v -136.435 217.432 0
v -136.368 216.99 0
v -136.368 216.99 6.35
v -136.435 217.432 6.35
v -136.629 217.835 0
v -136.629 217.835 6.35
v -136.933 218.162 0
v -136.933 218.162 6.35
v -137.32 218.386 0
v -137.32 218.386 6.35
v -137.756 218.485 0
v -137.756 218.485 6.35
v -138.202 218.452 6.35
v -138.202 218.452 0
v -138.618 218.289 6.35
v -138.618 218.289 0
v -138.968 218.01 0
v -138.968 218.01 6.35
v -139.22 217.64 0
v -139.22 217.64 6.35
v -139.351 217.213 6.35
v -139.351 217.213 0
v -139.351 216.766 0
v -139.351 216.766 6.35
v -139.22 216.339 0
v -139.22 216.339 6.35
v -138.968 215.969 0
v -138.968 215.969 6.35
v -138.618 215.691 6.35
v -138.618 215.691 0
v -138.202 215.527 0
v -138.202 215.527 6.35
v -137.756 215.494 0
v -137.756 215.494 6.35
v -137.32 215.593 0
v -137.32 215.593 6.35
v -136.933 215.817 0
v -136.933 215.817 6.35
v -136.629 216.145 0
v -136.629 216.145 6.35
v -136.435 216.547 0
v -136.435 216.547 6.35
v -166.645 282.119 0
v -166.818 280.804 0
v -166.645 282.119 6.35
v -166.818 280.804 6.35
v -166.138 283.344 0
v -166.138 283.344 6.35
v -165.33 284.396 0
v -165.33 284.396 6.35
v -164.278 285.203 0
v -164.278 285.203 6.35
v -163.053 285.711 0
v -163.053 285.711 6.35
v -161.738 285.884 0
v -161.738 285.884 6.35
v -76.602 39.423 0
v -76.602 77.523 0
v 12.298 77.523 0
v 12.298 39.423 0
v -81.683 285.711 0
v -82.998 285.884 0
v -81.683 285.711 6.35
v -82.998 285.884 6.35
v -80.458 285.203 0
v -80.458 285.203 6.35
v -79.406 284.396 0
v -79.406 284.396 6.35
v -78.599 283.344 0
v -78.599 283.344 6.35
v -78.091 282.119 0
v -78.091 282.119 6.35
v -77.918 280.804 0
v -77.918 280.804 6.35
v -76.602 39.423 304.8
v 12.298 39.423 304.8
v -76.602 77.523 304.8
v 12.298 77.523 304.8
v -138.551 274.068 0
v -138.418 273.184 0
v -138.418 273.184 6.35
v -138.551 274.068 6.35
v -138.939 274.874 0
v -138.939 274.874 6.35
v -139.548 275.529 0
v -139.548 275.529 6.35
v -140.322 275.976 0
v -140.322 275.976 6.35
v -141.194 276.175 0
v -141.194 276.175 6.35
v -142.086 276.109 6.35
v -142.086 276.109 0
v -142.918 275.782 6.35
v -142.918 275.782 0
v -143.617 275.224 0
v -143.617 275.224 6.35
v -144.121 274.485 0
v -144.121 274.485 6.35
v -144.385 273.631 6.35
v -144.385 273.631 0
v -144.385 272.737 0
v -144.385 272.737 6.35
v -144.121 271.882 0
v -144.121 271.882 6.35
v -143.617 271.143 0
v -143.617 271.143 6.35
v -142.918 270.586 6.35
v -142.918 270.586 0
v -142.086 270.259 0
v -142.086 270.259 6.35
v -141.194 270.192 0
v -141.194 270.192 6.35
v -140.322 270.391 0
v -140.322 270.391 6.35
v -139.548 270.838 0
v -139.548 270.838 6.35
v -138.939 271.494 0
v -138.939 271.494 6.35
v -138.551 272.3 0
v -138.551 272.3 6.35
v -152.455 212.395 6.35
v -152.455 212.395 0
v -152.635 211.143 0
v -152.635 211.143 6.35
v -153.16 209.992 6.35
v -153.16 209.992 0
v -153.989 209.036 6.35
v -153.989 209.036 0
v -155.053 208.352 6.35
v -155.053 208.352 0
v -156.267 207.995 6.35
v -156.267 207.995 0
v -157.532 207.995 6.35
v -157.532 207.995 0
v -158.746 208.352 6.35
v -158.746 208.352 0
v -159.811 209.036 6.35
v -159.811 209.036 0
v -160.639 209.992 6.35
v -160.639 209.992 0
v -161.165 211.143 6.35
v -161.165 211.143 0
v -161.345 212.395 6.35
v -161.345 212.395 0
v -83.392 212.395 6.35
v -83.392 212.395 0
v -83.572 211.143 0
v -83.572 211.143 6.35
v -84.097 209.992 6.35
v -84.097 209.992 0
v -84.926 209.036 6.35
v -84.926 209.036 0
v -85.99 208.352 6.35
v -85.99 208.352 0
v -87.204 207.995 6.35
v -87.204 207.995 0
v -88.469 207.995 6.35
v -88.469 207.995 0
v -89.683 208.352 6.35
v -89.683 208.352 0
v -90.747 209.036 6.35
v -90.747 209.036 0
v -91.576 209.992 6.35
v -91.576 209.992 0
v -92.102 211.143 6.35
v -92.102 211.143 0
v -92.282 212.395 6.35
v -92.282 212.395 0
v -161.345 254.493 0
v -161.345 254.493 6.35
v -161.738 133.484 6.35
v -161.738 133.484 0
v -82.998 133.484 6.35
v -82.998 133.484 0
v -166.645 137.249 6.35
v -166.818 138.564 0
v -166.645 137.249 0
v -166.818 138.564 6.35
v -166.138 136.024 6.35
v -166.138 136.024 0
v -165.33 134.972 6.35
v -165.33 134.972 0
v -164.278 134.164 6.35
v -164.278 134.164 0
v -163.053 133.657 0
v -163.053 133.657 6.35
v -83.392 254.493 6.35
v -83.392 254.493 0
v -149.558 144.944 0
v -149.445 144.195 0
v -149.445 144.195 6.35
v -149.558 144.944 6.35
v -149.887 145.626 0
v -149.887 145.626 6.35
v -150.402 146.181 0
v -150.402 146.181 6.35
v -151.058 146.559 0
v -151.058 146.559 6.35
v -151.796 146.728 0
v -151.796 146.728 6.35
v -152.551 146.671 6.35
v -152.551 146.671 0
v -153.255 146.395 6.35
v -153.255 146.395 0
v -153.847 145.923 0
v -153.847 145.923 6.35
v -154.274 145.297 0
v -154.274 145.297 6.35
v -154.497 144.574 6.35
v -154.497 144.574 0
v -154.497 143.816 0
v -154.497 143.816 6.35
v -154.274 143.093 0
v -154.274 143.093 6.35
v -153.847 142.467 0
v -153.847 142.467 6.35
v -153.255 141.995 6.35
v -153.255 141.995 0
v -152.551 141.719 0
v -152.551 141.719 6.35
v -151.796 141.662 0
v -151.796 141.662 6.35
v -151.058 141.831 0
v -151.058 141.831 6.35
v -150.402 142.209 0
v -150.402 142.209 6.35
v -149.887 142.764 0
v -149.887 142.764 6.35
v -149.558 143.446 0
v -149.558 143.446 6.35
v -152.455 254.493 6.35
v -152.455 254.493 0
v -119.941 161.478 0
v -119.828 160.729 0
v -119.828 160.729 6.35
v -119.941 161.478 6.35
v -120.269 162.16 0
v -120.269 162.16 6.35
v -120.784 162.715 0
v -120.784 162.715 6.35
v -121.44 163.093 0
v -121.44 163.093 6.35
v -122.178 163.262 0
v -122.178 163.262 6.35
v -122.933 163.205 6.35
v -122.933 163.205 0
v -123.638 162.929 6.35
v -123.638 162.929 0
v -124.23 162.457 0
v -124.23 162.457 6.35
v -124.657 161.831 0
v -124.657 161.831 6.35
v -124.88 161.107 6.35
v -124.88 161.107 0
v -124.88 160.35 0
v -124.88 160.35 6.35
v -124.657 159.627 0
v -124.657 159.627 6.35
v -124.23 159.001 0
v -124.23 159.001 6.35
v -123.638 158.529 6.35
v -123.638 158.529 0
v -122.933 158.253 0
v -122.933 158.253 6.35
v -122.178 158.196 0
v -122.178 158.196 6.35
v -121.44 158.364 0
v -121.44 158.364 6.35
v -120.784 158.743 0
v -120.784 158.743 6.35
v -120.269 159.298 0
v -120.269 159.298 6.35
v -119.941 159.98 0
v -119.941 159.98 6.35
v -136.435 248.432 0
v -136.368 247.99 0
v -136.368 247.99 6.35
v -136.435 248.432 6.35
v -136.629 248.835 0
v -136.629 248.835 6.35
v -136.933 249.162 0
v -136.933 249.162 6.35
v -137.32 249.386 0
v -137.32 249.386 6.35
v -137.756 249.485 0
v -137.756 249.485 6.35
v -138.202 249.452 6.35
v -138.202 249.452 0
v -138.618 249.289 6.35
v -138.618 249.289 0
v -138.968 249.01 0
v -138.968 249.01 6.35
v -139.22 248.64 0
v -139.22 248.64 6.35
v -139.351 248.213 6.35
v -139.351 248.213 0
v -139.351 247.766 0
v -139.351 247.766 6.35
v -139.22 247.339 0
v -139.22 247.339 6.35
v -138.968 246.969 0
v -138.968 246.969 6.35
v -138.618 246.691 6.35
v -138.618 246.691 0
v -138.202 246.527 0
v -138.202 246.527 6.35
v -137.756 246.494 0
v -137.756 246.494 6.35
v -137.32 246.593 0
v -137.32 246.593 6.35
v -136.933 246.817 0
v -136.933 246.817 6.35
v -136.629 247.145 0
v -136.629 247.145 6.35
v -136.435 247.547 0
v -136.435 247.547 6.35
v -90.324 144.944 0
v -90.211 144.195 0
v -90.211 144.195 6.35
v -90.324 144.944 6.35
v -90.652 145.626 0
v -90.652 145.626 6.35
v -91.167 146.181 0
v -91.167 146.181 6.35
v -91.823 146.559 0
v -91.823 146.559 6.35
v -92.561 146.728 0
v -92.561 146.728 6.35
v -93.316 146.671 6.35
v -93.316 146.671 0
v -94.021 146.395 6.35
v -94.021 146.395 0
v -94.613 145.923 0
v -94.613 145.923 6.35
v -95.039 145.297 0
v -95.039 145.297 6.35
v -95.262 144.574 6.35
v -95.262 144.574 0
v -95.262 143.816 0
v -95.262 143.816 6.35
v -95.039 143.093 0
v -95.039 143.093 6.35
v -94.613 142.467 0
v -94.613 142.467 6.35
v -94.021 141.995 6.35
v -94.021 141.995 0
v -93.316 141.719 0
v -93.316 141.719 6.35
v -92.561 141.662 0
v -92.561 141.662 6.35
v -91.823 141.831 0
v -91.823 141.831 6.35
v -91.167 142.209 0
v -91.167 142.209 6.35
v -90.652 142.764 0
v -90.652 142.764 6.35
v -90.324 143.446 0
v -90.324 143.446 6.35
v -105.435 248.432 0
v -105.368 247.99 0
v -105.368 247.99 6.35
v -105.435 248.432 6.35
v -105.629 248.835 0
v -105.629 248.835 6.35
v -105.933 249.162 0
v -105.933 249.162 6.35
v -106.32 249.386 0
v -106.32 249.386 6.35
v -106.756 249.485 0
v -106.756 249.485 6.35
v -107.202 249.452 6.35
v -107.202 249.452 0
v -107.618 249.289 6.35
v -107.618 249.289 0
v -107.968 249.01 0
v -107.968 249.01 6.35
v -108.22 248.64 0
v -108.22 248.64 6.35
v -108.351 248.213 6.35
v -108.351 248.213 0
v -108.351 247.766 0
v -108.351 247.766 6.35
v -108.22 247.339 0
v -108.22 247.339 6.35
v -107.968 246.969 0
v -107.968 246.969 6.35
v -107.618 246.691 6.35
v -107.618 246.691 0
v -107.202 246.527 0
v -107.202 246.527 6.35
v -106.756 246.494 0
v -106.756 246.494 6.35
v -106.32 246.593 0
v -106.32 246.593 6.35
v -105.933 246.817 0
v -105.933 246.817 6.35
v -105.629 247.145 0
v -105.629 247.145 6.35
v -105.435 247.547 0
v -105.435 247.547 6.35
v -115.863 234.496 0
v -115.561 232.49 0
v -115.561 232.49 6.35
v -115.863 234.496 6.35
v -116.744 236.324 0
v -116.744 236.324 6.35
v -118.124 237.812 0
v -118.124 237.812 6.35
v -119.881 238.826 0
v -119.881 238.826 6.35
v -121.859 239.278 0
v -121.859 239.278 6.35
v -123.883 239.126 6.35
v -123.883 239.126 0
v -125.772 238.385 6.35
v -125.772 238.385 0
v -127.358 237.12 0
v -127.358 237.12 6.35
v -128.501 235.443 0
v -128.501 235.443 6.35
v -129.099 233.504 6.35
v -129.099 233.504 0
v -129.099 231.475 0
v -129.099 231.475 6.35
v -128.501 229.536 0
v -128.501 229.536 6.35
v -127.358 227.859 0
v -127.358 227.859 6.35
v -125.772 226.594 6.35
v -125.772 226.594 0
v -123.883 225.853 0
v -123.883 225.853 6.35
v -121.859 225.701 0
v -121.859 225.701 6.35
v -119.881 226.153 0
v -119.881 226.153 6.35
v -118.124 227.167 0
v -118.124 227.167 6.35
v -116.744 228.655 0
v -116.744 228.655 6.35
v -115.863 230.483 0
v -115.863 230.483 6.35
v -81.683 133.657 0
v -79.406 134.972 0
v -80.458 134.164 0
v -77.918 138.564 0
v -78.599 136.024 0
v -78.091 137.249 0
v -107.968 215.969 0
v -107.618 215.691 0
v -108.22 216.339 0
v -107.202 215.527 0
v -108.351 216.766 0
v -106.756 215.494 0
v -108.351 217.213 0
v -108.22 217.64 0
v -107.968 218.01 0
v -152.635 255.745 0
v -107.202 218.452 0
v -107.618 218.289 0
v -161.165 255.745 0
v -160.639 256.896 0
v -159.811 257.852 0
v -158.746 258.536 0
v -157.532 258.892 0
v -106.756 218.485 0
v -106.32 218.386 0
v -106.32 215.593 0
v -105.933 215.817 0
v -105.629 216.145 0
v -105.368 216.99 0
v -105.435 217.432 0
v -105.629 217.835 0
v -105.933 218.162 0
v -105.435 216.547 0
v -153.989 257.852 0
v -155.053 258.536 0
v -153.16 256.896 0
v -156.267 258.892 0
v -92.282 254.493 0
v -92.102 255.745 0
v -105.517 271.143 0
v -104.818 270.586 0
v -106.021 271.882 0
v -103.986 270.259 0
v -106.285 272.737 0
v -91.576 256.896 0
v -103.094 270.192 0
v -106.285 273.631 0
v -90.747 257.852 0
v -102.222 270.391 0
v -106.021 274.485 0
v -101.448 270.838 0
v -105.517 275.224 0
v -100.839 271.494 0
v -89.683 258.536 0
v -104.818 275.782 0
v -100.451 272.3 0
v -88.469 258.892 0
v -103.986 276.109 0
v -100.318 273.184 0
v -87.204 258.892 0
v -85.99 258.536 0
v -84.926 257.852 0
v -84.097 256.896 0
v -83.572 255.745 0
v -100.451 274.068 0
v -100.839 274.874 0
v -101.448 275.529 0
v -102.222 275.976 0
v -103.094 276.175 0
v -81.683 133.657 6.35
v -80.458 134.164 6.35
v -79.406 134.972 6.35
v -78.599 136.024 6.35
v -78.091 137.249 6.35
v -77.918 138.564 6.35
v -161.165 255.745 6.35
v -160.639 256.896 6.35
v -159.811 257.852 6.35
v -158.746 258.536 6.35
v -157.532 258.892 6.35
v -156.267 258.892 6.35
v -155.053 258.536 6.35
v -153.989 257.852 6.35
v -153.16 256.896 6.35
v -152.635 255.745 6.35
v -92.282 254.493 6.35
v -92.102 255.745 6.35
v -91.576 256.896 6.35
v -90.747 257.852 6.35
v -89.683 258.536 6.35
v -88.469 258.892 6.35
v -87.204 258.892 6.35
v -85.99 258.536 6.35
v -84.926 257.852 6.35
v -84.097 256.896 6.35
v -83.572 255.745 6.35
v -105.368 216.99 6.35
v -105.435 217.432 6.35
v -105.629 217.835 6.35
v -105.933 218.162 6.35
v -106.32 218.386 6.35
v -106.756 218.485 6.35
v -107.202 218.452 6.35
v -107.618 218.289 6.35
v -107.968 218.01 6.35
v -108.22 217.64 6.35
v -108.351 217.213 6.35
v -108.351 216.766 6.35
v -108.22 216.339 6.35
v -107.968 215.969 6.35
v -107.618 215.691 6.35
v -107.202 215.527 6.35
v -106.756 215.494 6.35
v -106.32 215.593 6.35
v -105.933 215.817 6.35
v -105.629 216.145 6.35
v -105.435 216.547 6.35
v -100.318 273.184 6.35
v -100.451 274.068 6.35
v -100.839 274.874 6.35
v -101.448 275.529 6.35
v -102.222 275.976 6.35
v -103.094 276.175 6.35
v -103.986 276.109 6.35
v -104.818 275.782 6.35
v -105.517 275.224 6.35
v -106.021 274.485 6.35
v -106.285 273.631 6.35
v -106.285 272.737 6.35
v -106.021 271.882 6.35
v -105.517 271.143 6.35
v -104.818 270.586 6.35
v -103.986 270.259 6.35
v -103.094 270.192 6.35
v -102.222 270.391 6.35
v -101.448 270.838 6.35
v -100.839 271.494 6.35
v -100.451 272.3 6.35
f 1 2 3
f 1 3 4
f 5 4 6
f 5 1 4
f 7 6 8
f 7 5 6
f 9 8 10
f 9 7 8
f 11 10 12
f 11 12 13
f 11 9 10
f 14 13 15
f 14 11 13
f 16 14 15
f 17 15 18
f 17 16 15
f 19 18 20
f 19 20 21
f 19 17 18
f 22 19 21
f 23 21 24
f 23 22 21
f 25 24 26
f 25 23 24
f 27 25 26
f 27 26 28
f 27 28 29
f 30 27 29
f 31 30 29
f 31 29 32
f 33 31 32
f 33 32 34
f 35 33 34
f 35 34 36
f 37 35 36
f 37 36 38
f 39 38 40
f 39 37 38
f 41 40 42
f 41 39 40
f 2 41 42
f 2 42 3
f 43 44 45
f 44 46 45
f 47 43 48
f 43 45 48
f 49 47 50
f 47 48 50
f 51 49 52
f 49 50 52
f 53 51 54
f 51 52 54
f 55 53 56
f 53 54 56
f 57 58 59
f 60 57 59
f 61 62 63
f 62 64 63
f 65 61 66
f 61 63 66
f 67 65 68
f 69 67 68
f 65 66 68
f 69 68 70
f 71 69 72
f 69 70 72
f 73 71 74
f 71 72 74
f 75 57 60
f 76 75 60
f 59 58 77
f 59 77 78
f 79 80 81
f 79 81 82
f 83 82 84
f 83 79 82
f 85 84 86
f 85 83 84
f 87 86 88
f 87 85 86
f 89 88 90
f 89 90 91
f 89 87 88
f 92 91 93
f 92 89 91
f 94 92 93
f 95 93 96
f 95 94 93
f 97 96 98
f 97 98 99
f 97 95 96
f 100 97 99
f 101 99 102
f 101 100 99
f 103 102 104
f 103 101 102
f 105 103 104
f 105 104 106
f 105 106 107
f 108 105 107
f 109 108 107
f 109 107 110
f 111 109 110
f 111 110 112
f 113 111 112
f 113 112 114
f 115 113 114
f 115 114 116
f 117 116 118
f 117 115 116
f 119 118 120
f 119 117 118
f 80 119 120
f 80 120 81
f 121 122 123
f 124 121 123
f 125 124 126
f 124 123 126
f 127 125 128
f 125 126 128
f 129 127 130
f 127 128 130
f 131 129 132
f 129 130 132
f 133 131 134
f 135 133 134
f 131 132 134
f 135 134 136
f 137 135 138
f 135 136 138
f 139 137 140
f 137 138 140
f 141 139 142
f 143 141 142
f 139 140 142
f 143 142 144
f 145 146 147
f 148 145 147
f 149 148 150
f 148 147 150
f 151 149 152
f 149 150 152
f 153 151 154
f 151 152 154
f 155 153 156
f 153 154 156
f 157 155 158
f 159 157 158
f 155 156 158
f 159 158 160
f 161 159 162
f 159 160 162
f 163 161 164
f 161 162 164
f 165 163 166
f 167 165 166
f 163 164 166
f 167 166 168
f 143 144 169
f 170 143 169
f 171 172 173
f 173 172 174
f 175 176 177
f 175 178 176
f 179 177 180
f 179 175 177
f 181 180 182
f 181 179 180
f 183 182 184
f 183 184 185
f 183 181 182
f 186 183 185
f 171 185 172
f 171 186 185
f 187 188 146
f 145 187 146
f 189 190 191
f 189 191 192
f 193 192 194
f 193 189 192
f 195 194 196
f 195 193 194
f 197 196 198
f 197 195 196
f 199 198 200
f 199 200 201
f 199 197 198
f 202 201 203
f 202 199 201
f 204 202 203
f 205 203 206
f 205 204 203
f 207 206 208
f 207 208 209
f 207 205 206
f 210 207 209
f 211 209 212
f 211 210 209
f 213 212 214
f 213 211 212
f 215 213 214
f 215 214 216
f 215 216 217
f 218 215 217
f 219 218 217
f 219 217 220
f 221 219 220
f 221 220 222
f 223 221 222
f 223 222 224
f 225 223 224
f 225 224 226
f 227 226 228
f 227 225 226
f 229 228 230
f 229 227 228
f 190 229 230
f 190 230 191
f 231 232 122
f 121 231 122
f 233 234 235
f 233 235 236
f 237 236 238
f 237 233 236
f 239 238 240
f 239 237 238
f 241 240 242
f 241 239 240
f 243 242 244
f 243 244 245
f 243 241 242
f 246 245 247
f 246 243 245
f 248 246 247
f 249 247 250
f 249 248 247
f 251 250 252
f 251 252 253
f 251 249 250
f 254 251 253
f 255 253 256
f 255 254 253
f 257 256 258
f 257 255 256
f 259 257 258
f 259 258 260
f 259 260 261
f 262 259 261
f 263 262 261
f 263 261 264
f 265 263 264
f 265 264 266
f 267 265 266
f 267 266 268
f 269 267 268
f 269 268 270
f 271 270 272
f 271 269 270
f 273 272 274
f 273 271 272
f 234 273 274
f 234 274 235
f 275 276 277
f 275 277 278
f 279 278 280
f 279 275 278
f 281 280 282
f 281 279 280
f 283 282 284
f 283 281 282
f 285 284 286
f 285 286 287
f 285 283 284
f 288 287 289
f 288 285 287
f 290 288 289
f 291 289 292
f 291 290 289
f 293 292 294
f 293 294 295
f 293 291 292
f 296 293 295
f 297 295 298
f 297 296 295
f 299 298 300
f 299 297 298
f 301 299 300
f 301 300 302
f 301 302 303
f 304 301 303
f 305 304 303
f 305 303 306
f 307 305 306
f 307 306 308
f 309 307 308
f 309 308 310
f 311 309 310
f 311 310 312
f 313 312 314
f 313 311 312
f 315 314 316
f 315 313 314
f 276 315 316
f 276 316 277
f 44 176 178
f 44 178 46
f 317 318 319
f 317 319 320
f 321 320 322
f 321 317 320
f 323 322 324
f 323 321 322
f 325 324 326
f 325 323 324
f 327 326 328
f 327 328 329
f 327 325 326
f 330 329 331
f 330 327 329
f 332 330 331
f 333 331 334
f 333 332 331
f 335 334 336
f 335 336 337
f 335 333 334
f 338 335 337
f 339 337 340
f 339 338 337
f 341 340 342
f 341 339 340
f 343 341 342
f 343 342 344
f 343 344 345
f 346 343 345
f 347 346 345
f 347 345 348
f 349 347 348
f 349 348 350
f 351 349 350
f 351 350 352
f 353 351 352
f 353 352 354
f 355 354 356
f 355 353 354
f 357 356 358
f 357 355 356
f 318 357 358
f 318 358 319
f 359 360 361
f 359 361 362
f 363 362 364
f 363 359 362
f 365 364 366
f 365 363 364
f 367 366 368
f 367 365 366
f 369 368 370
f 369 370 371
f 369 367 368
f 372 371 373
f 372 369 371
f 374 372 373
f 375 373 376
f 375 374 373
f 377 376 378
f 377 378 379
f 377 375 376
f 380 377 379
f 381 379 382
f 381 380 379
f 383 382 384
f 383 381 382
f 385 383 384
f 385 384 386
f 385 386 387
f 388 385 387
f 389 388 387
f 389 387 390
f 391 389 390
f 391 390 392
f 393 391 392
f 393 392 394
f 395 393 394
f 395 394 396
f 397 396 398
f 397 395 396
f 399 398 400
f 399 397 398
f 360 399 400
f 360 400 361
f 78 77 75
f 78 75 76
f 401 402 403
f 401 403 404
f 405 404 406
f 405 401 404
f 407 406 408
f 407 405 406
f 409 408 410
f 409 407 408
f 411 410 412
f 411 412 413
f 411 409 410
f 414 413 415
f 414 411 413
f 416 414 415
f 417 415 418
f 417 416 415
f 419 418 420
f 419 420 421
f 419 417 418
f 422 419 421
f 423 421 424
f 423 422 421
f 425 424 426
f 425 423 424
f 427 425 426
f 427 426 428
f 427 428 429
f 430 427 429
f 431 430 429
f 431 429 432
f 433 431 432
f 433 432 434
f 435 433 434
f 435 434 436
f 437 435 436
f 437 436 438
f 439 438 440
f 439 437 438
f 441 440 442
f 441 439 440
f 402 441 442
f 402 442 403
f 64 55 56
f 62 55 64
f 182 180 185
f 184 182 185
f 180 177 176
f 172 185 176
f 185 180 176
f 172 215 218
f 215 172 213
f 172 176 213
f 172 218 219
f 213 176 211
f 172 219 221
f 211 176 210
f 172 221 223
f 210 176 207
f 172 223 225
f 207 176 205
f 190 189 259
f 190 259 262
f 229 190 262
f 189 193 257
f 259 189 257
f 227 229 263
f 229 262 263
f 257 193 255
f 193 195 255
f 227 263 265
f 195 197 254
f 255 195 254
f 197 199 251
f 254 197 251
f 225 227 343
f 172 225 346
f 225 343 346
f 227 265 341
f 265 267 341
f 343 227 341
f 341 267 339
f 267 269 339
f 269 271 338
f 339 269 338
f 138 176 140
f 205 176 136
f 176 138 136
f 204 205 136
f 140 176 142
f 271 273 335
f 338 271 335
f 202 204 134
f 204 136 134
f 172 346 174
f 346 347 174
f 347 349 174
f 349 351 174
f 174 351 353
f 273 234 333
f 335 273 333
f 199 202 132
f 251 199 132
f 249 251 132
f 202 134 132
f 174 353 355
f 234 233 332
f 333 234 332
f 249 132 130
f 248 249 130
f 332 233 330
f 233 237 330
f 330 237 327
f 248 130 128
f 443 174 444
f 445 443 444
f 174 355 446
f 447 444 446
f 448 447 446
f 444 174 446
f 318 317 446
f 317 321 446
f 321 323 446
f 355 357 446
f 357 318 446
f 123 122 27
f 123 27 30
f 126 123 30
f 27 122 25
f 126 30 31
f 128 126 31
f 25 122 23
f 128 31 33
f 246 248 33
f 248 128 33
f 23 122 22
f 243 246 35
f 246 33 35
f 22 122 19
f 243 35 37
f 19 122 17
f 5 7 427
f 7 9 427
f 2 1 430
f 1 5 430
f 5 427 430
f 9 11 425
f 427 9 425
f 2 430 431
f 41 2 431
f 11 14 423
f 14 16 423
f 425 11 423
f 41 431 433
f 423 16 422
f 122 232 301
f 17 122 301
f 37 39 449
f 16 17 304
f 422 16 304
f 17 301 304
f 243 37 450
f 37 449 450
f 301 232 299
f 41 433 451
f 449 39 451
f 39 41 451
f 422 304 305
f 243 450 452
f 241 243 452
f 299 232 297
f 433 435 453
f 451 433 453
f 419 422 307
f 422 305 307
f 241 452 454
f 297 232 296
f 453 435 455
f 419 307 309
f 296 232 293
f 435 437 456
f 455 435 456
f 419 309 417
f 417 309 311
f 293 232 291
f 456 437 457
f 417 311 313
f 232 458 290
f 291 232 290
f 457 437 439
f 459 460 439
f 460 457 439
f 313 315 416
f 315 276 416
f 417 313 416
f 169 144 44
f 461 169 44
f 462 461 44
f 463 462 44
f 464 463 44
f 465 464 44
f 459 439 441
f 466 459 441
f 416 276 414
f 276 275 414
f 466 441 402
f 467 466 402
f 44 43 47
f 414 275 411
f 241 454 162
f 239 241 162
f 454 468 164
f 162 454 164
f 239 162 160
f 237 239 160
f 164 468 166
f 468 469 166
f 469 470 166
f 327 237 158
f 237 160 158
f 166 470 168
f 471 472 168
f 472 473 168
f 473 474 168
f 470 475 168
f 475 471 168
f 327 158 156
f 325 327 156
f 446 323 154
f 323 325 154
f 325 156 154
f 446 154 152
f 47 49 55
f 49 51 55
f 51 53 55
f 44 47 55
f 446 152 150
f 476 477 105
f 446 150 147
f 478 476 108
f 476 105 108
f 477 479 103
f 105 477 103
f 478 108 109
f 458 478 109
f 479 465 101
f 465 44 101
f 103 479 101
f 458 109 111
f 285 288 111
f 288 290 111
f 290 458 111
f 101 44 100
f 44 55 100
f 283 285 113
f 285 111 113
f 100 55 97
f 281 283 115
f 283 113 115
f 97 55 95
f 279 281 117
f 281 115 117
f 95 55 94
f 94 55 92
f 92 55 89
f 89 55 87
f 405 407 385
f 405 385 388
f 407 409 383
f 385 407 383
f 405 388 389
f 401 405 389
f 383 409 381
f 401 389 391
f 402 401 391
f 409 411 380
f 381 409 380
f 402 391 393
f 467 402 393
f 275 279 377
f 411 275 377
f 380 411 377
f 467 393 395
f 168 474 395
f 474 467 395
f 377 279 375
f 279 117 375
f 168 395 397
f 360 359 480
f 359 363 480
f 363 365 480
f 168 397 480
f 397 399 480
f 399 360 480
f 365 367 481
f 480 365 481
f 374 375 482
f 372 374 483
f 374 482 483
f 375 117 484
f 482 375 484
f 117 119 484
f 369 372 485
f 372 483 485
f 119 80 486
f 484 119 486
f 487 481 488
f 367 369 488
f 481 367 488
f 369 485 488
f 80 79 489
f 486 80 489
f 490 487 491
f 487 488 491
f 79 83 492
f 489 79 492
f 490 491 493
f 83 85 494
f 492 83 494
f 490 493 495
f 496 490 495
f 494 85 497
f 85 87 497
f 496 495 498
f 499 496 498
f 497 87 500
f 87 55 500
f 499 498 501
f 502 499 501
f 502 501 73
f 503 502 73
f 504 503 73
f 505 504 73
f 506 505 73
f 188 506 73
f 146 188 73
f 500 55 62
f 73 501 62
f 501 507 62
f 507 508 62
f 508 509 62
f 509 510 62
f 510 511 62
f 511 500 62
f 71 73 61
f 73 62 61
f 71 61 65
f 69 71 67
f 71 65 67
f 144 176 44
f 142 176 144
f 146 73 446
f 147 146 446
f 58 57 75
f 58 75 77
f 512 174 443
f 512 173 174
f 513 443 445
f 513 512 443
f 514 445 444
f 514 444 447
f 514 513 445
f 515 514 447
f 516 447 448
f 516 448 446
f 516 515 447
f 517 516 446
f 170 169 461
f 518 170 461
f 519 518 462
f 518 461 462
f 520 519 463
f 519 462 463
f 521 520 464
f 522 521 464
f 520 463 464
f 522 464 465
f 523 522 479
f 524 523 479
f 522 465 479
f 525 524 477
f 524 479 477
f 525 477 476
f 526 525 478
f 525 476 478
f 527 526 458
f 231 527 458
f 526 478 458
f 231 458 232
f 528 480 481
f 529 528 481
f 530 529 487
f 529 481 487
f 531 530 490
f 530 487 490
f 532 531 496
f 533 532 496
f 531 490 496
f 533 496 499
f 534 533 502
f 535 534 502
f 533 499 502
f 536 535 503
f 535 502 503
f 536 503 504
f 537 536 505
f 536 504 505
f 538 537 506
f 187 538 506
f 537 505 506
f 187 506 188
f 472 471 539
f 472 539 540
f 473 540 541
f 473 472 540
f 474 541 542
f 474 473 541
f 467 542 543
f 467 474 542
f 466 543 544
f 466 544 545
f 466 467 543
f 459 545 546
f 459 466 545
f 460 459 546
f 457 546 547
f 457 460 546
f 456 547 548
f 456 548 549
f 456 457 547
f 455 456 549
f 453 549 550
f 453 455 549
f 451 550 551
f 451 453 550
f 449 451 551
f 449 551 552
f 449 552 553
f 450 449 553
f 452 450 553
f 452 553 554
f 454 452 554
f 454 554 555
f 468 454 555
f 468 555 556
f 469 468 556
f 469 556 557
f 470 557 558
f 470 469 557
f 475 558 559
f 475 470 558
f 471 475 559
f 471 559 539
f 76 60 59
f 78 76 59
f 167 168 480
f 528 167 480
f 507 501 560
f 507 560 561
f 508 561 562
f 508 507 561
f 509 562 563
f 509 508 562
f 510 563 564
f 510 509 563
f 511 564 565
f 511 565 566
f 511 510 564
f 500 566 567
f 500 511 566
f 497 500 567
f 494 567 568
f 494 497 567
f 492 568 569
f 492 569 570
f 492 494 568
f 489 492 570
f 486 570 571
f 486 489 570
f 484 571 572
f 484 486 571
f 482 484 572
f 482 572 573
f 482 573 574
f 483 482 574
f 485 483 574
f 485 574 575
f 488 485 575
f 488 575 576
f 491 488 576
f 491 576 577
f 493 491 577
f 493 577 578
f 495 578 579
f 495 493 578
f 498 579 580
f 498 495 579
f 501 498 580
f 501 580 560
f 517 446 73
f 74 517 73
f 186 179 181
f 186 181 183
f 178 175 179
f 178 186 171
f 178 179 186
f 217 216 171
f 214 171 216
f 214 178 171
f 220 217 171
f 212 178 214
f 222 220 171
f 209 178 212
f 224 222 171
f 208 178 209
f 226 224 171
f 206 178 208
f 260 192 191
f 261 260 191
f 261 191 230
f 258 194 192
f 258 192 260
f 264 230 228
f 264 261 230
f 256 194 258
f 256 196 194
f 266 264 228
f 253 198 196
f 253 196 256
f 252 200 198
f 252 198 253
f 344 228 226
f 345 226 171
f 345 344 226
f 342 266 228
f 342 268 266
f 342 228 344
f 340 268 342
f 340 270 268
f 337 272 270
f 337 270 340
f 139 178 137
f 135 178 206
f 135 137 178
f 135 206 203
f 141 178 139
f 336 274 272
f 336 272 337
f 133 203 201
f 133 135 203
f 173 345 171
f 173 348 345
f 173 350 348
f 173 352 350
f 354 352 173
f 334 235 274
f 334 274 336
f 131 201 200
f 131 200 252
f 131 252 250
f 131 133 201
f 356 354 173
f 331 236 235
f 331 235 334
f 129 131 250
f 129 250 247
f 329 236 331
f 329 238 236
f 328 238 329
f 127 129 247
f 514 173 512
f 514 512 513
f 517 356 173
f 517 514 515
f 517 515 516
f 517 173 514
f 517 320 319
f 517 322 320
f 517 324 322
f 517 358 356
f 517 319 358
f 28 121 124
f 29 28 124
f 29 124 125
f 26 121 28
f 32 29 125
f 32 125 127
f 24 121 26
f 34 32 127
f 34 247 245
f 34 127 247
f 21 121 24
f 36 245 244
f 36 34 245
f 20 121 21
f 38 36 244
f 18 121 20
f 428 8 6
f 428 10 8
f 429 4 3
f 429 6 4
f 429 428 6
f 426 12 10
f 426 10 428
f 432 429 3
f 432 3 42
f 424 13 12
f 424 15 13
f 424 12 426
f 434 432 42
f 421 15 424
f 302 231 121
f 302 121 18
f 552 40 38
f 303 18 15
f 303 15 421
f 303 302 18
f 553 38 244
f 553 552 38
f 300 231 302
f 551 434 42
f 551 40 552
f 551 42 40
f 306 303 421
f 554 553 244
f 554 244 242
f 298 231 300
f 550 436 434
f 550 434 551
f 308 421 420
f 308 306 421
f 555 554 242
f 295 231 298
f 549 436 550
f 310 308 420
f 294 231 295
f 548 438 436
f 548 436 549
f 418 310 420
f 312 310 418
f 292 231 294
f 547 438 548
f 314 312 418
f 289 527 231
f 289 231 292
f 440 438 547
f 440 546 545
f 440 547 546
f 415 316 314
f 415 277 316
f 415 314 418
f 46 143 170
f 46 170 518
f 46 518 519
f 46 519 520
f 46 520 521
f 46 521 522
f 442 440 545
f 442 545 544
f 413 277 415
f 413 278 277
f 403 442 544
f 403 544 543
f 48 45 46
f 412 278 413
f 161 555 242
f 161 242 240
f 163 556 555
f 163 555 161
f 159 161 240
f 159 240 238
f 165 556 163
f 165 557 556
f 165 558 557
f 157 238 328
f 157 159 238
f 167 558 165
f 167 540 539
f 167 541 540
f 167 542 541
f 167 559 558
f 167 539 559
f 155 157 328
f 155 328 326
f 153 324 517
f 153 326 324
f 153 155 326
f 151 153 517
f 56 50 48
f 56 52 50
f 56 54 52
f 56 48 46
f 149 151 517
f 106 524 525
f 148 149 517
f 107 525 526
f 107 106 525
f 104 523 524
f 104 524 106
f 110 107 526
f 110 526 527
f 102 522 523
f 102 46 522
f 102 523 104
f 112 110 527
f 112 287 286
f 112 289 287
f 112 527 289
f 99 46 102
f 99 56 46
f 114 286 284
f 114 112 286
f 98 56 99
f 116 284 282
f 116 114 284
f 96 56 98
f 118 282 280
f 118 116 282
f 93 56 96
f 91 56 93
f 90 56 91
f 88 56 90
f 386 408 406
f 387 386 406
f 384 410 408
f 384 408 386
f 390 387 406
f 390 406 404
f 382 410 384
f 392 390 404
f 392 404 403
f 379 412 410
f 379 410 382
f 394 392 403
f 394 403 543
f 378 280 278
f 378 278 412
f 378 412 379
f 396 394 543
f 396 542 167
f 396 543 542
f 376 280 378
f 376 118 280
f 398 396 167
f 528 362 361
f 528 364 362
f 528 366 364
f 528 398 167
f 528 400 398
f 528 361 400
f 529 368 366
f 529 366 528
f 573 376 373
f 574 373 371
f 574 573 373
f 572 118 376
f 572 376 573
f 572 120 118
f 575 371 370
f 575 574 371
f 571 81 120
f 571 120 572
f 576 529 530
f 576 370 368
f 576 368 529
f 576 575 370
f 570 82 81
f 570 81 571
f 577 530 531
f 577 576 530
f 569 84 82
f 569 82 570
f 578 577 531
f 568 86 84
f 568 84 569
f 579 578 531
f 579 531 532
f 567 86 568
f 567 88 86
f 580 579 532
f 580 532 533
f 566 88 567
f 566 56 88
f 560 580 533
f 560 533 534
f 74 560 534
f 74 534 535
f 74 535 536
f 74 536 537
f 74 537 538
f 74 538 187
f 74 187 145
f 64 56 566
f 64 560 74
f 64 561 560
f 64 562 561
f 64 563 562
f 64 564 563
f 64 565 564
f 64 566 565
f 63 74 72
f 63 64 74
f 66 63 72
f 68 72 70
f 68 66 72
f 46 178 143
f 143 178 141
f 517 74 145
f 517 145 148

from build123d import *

# Parameters (mm, degrees)
F0_W     = 88.9
F0_H     = 152.4
F0_R     = 2.54
F0_R_2   = 1.5
F0_R_3   = 6.8073941992
F0_R_4   = 3
F1_DEPTH = 6.35
F2_R     = 5.08
F3_W     = 88.9
F3_H     = 38.1
F4_DEPTH = 304.8


# Not quite as in the source:
# - a length typed as a fraction of an inch, garbled in the dataset ("3 / 203.2 mm" for 3/8 in), is restored


with BuildPart() as f1:
    # F0 (on Top) → F1 (new body)
    with BuildSketch(Plane.XY):
        with Locations((-122.368119657, 209.6838048907)):
            Rectangle(F0_W, F0_H)
        with Locations((-151.9854813814, 144.194945693)):
            Circle(F0_R, mode=Mode.SUBTRACT)
        with Locations((-122.368119657, 160.7289016247)):
            Circle(F0_R, mode=Mode.SUBTRACT)
        with Locations((-92.7507579327, 144.194945693)):
            Circle(F0_R, mode=Mode.SUBTRACT)
        with BuildLine():
            Line((-161.3446665764, 212.3949378729), (-161.3446665764, 254.4926702976))
            ThreePointArc((-161.3446665764, 254.4926702976), (-156.8996665764, 258.9376702976), (-152.4546665764, 254.4926702976))
            Line((-152.4546665764, 254.4926702976), (-152.4546665764, 212.3949378729))
            ThreePointArc((-152.4546665764, 212.3949378729), (-156.8996665764, 207.9499378729), (-161.3446665764, 212.3949378729))
        make_face(mode=Mode.SUBTRACT)
        with Locations((-137.868119657, 216.9896082271)):
            Circle(F0_R_2, mode=Mode.SUBTRACT)
        with Locations((-122.368119657, 232.4896082271)):
            Circle(F0_R_3, mode=Mode.SUBTRACT)
        with Locations((-137.868119657, 247.9896082271)):
            Circle(F0_R_2, mode=Mode.SUBTRACT)
        with Locations((-141.418119657, 273.1838048907)):
            Circle(F0_R_4, mode=Mode.SUBTRACT)
        with Locations((-106.868119657, 216.9896082271)):
            Circle(F0_R_2, mode=Mode.SUBTRACT)
        with BuildLine():
            Line((-92.2815727377, 212.3949378729), (-92.2815727377, 254.4926702976))
            ThreePointArc((-92.2815727377, 254.4926702976), (-87.8365727377, 258.9376702976), (-83.3915727377, 254.4926702976))
            Line((-83.3915727377, 254.4926702976), (-83.3915727377, 212.3949378729))
            ThreePointArc((-83.3915727377, 212.3949378729), (-87.8365727377, 207.9499378729), (-92.2815727377, 212.3949378729))
        make_face(mode=Mode.SUBTRACT)
        with Locations((-106.868119657, 247.9896082271)):
            Circle(F0_R_2, mode=Mode.SUBTRACT)
        with Locations((-103.318119657, 273.1838048907)):
            Circle(F0_R_4, mode=Mode.SUBTRACT)
    extrude(amount=F1_DEPTH)

    # F2
    f2_edges = [f1.edges().sort_by_distance(p)[0] for p in [
        (-77.91812, 285.883805, 3.175),
        (-166.81812, 285.883805, 3.175),
        (-77.91812, 133.483805, 3.175),
        (-166.81812, 133.483805, 3.175),
    ]]
    fillet(f2_edges, radius=F2_R)


with BuildPart() as f4:
    # F3 (on Top) → F4 (new body)
    with BuildSketch(Plane.XY):
        with Locations((-32.1518591821, 58.4733763218)):
            Rectangle(F3_W, F3_H)
    extrude(amount=F4_DEPTH)


solid = Compound([f1.part, f4.part])
